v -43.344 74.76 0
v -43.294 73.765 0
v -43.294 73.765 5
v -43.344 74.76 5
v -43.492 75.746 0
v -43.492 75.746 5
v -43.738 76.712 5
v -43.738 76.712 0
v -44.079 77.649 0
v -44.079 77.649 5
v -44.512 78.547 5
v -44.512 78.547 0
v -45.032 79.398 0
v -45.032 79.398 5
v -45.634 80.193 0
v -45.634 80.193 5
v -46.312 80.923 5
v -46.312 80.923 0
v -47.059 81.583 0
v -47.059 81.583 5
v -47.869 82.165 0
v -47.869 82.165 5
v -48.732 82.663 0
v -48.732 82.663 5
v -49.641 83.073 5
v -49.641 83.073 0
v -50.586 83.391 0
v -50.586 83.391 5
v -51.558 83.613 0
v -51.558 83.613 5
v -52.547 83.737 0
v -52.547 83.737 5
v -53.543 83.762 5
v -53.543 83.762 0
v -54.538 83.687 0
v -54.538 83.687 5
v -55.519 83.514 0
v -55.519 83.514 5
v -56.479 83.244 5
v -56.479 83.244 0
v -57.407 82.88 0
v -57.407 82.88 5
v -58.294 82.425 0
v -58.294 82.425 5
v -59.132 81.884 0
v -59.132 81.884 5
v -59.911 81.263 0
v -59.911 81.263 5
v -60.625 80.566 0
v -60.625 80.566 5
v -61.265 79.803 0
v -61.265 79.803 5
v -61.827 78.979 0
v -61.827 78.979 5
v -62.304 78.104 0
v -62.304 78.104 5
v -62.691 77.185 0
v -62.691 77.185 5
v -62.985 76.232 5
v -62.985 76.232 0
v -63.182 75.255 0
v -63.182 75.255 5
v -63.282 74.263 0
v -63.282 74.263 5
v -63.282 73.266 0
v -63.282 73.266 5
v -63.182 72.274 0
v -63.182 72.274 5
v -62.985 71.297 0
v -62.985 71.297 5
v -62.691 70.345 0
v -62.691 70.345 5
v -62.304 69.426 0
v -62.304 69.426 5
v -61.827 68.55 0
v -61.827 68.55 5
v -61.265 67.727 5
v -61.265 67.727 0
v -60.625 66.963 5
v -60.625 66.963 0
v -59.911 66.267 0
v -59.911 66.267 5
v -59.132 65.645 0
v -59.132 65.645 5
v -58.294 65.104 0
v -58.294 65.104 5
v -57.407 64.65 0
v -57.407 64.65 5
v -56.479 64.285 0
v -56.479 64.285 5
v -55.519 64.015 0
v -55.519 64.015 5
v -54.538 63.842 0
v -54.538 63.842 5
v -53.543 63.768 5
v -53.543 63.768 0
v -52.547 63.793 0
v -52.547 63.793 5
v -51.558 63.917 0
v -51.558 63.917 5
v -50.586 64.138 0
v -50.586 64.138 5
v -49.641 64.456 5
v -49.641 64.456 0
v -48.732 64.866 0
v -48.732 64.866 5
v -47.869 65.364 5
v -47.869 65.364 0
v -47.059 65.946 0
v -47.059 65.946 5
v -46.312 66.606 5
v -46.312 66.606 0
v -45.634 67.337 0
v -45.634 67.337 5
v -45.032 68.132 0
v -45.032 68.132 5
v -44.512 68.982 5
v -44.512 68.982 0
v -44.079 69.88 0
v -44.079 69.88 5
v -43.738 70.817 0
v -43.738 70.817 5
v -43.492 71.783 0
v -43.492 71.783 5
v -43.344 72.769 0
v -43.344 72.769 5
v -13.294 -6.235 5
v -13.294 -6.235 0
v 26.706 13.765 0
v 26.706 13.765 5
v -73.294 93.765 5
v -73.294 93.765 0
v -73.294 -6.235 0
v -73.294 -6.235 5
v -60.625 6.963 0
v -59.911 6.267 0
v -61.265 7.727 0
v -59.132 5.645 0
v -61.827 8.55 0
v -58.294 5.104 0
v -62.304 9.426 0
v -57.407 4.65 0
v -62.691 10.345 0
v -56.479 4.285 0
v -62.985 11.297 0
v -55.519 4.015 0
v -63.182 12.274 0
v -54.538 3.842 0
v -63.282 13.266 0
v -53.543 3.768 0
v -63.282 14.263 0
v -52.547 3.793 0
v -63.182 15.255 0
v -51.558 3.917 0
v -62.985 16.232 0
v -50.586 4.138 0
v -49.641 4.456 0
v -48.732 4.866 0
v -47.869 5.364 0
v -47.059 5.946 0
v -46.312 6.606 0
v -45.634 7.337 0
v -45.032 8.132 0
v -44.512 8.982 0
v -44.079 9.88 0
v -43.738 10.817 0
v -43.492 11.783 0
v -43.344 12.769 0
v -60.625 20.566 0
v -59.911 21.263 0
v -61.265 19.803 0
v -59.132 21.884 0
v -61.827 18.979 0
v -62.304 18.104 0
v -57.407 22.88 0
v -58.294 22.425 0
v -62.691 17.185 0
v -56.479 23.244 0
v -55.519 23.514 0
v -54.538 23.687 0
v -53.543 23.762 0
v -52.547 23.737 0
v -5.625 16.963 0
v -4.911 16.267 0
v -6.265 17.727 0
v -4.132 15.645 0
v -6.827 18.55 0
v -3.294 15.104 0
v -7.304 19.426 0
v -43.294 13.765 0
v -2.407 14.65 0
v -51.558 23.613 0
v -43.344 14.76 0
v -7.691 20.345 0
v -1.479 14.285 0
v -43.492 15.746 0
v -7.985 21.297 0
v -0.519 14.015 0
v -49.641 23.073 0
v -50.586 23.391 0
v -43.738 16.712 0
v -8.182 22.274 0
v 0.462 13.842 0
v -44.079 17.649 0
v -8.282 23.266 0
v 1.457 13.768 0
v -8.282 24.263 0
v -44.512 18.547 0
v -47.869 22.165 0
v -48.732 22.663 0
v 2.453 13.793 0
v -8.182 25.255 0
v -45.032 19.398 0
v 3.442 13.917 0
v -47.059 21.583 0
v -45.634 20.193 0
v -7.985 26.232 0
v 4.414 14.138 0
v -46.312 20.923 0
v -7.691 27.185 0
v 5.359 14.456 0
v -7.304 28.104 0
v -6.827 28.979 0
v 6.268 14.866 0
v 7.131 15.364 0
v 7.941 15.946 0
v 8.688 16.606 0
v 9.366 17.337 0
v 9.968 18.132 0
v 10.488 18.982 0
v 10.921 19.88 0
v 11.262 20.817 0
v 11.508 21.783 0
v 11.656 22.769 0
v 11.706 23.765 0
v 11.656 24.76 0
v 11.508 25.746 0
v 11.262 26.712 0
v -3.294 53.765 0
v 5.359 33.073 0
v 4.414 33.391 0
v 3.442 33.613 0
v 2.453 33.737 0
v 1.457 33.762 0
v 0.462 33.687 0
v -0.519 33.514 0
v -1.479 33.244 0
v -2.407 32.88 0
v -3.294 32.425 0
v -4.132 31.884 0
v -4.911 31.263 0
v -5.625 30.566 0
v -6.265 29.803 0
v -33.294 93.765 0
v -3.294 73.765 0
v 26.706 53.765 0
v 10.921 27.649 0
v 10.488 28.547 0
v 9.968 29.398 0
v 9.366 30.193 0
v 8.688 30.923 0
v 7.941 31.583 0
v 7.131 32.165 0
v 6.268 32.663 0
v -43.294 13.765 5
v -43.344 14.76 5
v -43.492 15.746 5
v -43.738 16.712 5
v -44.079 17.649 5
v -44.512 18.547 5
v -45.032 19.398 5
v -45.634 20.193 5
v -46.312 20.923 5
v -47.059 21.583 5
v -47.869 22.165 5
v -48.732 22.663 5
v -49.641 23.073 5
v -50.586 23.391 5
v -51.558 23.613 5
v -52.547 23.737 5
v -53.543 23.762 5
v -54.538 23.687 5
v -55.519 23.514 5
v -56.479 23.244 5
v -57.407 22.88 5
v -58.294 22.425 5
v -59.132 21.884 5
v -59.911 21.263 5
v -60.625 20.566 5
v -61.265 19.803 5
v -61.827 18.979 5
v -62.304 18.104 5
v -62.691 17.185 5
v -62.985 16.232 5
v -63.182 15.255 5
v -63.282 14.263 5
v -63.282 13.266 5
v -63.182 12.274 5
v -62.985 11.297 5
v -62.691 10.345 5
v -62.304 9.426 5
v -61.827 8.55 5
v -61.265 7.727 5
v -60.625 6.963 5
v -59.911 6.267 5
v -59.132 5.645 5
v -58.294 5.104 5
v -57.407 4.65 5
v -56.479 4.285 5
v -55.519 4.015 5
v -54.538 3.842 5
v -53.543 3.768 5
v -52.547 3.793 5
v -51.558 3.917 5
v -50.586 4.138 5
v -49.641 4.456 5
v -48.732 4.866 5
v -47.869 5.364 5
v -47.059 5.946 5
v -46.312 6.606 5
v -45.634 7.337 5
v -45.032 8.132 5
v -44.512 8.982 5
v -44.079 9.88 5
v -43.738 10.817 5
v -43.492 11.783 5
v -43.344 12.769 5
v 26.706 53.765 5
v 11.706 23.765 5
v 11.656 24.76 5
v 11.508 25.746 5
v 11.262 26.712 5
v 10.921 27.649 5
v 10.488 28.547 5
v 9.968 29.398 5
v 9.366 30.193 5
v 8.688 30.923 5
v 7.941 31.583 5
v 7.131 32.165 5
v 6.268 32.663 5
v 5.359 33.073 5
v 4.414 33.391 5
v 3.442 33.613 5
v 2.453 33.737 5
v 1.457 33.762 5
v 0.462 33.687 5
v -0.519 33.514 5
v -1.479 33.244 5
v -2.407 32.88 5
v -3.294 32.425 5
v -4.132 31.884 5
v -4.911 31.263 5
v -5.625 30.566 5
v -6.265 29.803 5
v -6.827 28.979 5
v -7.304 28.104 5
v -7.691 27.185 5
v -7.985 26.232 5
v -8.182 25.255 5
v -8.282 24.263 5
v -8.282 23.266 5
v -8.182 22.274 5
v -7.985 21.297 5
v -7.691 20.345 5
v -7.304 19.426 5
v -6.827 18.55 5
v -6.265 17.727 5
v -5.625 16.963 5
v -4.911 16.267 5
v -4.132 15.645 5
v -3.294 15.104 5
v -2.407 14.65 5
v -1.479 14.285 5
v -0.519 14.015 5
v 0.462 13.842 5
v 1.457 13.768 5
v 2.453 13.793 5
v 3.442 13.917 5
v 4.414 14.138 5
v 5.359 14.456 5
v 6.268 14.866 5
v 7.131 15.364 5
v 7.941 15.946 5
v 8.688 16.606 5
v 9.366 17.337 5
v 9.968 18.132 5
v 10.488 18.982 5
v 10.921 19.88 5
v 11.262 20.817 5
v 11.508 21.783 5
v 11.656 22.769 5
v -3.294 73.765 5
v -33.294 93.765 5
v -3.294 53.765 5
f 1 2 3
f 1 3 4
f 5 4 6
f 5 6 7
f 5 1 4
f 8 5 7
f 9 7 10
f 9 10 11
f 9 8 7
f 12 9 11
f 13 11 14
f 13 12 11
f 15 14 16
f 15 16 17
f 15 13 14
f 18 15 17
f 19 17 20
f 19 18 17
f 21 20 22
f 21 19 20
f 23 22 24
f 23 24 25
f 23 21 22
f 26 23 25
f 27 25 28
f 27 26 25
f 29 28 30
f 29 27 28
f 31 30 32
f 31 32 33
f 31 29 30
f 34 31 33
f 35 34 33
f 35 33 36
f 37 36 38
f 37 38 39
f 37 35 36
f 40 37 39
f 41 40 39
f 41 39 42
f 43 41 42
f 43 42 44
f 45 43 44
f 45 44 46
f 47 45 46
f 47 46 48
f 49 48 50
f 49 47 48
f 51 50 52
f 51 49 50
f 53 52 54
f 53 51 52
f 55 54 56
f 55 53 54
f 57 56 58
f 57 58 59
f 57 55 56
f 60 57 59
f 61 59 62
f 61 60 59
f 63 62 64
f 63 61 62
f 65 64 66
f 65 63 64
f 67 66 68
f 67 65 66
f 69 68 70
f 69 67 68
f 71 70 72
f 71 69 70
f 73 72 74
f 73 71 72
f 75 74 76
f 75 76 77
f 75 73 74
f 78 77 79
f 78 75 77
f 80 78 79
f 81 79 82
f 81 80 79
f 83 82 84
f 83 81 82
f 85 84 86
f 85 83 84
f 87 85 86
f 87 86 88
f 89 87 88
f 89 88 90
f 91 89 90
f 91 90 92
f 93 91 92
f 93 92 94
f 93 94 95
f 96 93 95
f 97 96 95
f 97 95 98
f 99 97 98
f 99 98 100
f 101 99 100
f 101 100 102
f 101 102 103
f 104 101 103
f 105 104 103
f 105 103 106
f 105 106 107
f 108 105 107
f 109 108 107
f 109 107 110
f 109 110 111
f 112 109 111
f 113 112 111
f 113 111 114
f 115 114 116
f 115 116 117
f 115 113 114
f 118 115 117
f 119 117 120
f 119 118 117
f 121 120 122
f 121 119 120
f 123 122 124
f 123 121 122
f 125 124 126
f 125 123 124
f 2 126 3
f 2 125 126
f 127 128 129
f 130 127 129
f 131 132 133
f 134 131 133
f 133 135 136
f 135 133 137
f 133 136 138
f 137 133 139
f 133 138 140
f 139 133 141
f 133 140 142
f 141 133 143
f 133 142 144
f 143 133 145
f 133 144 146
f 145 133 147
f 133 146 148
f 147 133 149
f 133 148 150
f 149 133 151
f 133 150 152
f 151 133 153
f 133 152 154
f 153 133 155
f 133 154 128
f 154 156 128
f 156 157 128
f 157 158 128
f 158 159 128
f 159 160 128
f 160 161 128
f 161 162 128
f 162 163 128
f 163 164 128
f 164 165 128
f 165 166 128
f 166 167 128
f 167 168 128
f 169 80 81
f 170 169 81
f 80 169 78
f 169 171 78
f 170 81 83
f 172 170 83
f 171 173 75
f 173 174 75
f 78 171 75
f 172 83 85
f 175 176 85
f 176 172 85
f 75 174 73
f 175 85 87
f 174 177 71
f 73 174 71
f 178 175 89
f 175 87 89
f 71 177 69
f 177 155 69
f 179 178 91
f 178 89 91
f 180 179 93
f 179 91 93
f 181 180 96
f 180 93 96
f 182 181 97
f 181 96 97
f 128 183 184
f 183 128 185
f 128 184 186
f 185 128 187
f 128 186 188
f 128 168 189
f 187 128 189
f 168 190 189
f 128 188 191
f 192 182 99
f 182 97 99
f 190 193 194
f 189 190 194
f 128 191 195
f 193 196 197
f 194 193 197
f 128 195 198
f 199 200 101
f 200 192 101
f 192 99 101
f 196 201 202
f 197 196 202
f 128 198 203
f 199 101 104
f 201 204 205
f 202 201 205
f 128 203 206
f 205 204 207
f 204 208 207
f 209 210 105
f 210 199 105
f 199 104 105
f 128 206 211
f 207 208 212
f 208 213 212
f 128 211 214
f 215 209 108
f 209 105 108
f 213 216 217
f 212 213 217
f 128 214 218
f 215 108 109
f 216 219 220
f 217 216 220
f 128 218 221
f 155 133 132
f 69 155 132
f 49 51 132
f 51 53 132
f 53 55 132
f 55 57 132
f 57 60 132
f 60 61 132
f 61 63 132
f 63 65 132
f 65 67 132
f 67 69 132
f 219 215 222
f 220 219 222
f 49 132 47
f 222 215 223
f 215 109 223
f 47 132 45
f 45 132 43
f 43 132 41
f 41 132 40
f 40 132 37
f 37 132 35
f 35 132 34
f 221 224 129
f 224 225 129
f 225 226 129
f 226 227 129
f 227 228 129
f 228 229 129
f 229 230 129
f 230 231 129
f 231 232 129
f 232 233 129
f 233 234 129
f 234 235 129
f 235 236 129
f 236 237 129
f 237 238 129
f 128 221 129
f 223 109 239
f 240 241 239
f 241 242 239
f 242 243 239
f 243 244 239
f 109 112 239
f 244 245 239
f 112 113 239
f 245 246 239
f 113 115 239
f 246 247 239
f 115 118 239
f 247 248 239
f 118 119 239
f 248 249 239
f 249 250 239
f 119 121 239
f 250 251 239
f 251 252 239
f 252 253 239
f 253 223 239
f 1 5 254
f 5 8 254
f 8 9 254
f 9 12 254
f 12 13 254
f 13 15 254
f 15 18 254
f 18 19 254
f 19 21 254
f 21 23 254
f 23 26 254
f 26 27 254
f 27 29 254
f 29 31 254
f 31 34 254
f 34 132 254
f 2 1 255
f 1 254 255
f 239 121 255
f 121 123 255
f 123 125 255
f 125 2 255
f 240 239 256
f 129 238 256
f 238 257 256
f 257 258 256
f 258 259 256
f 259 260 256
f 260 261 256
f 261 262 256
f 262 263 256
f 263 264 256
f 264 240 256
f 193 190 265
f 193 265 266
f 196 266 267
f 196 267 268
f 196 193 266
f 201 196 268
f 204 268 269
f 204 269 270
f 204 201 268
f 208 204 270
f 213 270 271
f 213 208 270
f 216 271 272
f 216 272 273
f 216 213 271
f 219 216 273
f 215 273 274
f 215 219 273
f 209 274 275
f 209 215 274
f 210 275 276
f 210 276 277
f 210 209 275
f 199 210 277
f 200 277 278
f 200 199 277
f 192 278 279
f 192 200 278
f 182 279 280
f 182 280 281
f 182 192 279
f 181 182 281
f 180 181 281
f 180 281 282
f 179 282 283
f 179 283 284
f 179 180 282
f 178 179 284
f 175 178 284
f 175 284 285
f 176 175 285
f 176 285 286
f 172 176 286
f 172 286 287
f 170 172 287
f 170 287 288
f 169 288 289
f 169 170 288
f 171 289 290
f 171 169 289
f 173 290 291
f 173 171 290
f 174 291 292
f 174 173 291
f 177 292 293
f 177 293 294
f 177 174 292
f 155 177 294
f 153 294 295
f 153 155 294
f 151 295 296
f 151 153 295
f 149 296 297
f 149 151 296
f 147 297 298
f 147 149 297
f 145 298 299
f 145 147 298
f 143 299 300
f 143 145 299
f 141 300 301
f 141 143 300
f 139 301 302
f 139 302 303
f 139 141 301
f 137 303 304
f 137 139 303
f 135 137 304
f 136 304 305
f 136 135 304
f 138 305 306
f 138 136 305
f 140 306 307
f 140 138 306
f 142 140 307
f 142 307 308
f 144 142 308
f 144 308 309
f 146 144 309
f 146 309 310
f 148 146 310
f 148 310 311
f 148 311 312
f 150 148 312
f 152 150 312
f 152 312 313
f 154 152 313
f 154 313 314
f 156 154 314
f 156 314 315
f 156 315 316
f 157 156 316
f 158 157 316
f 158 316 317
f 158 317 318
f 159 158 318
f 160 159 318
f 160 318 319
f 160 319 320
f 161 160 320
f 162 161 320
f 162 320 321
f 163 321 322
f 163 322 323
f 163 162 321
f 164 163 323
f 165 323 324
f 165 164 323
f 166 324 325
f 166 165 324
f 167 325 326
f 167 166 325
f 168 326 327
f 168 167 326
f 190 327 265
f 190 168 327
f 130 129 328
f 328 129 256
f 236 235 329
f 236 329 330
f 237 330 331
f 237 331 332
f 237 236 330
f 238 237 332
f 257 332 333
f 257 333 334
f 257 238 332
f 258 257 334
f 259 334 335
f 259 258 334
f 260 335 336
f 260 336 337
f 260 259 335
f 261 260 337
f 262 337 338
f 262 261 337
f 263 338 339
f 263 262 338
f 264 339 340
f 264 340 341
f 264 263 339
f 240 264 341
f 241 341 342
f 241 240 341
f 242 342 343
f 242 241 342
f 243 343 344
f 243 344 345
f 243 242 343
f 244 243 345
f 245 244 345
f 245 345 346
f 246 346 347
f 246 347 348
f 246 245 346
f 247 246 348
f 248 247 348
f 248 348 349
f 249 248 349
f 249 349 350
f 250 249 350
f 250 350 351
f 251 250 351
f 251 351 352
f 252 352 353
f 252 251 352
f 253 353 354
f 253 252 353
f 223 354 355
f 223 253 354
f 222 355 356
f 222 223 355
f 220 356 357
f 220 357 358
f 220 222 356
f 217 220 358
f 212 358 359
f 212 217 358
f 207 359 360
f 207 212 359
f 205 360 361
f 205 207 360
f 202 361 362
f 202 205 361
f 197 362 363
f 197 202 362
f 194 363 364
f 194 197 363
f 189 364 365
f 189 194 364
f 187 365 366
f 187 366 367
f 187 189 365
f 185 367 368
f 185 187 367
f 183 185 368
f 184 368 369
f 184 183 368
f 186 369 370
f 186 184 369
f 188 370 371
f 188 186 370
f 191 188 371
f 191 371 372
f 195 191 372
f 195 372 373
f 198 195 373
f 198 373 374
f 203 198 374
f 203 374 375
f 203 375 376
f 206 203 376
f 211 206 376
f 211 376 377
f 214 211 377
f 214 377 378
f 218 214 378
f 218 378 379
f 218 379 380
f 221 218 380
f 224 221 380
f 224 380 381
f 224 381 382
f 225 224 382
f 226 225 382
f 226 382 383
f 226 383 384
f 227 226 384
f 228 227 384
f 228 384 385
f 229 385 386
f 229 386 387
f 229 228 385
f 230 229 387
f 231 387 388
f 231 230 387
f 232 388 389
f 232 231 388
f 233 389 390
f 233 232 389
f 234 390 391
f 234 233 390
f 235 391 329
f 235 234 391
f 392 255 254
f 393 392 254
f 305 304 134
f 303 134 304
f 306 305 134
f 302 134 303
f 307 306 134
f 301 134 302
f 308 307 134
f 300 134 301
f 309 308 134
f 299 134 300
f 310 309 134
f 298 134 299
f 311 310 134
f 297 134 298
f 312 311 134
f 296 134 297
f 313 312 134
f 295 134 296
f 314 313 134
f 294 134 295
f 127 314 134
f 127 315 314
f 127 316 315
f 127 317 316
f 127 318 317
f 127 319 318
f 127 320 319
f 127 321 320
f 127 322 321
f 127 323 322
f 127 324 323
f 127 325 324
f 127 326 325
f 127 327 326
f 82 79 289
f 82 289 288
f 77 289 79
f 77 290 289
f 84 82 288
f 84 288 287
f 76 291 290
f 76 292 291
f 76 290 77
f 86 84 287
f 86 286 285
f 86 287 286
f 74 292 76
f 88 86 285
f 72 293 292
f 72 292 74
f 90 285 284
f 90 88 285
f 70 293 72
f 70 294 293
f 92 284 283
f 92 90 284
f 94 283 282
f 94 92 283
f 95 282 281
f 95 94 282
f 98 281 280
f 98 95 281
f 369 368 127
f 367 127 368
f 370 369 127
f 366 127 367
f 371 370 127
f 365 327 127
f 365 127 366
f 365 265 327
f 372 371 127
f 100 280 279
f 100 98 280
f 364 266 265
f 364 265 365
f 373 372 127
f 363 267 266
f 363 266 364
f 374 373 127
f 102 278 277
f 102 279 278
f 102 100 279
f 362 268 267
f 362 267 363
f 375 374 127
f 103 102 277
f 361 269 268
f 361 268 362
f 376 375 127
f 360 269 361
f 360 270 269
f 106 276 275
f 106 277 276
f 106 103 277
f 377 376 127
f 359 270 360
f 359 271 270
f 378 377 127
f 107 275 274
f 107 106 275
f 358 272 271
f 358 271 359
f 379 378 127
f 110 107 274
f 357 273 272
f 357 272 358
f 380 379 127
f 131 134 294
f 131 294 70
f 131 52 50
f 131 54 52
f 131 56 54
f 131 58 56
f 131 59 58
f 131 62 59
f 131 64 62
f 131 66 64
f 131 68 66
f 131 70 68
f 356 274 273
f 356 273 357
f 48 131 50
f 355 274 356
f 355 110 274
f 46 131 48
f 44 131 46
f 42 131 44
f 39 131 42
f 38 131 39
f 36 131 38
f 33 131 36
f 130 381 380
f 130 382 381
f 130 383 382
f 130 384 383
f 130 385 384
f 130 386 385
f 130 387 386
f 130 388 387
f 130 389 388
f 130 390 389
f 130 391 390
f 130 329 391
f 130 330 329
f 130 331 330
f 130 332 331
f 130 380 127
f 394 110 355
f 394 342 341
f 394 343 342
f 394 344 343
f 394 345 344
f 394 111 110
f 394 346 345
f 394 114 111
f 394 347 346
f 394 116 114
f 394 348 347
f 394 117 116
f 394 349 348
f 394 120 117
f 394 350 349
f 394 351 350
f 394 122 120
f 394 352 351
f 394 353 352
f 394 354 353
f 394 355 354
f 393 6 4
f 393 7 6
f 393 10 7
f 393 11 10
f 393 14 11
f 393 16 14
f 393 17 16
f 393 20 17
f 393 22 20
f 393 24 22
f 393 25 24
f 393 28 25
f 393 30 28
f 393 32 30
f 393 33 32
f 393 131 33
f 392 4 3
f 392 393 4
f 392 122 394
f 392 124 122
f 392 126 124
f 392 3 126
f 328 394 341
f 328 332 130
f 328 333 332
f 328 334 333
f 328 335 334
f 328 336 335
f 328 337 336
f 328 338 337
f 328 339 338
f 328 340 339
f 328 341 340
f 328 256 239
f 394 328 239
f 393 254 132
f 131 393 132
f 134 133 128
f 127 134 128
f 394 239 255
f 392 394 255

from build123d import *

# Parameters (mm, degrees)
SKETCH1_R           = 10
BOSS_EXTRUDE1_DEPTH = 5


with BuildPart() as part:
    # Sketch1 → Boss-Extrude1 (new body)
    with BuildSketch(Plane.XY):
        Polygon((-73.294117647, 93.764705882), (-73.294117647, -6.235294118), (-13.294117647, -6.235294118), (26.705882353, 13.764705882), (26.705882353, 53.764705882), (-3.294117647, 53.764705882), (-3.294117647, 73.764705882), (-33.294117647, 93.764705882), align=None)
        with Locations((-53.294117647, 73.764705882)):
            Circle(SKETCH1_R, mode=Mode.SUBTRACT)
        with Locations((-53.294117647, 13.764705882)):
            Circle(SKETCH1_R, mode=Mode.SUBTRACT)
        with Locations((1.705882353, 23.764705882)):
            Circle(SKETCH1_R, mode=Mode.SUBTRACT)
    extrude(amount=BOSS_EXTRUDE1_DEPTH)


solid = part.part
